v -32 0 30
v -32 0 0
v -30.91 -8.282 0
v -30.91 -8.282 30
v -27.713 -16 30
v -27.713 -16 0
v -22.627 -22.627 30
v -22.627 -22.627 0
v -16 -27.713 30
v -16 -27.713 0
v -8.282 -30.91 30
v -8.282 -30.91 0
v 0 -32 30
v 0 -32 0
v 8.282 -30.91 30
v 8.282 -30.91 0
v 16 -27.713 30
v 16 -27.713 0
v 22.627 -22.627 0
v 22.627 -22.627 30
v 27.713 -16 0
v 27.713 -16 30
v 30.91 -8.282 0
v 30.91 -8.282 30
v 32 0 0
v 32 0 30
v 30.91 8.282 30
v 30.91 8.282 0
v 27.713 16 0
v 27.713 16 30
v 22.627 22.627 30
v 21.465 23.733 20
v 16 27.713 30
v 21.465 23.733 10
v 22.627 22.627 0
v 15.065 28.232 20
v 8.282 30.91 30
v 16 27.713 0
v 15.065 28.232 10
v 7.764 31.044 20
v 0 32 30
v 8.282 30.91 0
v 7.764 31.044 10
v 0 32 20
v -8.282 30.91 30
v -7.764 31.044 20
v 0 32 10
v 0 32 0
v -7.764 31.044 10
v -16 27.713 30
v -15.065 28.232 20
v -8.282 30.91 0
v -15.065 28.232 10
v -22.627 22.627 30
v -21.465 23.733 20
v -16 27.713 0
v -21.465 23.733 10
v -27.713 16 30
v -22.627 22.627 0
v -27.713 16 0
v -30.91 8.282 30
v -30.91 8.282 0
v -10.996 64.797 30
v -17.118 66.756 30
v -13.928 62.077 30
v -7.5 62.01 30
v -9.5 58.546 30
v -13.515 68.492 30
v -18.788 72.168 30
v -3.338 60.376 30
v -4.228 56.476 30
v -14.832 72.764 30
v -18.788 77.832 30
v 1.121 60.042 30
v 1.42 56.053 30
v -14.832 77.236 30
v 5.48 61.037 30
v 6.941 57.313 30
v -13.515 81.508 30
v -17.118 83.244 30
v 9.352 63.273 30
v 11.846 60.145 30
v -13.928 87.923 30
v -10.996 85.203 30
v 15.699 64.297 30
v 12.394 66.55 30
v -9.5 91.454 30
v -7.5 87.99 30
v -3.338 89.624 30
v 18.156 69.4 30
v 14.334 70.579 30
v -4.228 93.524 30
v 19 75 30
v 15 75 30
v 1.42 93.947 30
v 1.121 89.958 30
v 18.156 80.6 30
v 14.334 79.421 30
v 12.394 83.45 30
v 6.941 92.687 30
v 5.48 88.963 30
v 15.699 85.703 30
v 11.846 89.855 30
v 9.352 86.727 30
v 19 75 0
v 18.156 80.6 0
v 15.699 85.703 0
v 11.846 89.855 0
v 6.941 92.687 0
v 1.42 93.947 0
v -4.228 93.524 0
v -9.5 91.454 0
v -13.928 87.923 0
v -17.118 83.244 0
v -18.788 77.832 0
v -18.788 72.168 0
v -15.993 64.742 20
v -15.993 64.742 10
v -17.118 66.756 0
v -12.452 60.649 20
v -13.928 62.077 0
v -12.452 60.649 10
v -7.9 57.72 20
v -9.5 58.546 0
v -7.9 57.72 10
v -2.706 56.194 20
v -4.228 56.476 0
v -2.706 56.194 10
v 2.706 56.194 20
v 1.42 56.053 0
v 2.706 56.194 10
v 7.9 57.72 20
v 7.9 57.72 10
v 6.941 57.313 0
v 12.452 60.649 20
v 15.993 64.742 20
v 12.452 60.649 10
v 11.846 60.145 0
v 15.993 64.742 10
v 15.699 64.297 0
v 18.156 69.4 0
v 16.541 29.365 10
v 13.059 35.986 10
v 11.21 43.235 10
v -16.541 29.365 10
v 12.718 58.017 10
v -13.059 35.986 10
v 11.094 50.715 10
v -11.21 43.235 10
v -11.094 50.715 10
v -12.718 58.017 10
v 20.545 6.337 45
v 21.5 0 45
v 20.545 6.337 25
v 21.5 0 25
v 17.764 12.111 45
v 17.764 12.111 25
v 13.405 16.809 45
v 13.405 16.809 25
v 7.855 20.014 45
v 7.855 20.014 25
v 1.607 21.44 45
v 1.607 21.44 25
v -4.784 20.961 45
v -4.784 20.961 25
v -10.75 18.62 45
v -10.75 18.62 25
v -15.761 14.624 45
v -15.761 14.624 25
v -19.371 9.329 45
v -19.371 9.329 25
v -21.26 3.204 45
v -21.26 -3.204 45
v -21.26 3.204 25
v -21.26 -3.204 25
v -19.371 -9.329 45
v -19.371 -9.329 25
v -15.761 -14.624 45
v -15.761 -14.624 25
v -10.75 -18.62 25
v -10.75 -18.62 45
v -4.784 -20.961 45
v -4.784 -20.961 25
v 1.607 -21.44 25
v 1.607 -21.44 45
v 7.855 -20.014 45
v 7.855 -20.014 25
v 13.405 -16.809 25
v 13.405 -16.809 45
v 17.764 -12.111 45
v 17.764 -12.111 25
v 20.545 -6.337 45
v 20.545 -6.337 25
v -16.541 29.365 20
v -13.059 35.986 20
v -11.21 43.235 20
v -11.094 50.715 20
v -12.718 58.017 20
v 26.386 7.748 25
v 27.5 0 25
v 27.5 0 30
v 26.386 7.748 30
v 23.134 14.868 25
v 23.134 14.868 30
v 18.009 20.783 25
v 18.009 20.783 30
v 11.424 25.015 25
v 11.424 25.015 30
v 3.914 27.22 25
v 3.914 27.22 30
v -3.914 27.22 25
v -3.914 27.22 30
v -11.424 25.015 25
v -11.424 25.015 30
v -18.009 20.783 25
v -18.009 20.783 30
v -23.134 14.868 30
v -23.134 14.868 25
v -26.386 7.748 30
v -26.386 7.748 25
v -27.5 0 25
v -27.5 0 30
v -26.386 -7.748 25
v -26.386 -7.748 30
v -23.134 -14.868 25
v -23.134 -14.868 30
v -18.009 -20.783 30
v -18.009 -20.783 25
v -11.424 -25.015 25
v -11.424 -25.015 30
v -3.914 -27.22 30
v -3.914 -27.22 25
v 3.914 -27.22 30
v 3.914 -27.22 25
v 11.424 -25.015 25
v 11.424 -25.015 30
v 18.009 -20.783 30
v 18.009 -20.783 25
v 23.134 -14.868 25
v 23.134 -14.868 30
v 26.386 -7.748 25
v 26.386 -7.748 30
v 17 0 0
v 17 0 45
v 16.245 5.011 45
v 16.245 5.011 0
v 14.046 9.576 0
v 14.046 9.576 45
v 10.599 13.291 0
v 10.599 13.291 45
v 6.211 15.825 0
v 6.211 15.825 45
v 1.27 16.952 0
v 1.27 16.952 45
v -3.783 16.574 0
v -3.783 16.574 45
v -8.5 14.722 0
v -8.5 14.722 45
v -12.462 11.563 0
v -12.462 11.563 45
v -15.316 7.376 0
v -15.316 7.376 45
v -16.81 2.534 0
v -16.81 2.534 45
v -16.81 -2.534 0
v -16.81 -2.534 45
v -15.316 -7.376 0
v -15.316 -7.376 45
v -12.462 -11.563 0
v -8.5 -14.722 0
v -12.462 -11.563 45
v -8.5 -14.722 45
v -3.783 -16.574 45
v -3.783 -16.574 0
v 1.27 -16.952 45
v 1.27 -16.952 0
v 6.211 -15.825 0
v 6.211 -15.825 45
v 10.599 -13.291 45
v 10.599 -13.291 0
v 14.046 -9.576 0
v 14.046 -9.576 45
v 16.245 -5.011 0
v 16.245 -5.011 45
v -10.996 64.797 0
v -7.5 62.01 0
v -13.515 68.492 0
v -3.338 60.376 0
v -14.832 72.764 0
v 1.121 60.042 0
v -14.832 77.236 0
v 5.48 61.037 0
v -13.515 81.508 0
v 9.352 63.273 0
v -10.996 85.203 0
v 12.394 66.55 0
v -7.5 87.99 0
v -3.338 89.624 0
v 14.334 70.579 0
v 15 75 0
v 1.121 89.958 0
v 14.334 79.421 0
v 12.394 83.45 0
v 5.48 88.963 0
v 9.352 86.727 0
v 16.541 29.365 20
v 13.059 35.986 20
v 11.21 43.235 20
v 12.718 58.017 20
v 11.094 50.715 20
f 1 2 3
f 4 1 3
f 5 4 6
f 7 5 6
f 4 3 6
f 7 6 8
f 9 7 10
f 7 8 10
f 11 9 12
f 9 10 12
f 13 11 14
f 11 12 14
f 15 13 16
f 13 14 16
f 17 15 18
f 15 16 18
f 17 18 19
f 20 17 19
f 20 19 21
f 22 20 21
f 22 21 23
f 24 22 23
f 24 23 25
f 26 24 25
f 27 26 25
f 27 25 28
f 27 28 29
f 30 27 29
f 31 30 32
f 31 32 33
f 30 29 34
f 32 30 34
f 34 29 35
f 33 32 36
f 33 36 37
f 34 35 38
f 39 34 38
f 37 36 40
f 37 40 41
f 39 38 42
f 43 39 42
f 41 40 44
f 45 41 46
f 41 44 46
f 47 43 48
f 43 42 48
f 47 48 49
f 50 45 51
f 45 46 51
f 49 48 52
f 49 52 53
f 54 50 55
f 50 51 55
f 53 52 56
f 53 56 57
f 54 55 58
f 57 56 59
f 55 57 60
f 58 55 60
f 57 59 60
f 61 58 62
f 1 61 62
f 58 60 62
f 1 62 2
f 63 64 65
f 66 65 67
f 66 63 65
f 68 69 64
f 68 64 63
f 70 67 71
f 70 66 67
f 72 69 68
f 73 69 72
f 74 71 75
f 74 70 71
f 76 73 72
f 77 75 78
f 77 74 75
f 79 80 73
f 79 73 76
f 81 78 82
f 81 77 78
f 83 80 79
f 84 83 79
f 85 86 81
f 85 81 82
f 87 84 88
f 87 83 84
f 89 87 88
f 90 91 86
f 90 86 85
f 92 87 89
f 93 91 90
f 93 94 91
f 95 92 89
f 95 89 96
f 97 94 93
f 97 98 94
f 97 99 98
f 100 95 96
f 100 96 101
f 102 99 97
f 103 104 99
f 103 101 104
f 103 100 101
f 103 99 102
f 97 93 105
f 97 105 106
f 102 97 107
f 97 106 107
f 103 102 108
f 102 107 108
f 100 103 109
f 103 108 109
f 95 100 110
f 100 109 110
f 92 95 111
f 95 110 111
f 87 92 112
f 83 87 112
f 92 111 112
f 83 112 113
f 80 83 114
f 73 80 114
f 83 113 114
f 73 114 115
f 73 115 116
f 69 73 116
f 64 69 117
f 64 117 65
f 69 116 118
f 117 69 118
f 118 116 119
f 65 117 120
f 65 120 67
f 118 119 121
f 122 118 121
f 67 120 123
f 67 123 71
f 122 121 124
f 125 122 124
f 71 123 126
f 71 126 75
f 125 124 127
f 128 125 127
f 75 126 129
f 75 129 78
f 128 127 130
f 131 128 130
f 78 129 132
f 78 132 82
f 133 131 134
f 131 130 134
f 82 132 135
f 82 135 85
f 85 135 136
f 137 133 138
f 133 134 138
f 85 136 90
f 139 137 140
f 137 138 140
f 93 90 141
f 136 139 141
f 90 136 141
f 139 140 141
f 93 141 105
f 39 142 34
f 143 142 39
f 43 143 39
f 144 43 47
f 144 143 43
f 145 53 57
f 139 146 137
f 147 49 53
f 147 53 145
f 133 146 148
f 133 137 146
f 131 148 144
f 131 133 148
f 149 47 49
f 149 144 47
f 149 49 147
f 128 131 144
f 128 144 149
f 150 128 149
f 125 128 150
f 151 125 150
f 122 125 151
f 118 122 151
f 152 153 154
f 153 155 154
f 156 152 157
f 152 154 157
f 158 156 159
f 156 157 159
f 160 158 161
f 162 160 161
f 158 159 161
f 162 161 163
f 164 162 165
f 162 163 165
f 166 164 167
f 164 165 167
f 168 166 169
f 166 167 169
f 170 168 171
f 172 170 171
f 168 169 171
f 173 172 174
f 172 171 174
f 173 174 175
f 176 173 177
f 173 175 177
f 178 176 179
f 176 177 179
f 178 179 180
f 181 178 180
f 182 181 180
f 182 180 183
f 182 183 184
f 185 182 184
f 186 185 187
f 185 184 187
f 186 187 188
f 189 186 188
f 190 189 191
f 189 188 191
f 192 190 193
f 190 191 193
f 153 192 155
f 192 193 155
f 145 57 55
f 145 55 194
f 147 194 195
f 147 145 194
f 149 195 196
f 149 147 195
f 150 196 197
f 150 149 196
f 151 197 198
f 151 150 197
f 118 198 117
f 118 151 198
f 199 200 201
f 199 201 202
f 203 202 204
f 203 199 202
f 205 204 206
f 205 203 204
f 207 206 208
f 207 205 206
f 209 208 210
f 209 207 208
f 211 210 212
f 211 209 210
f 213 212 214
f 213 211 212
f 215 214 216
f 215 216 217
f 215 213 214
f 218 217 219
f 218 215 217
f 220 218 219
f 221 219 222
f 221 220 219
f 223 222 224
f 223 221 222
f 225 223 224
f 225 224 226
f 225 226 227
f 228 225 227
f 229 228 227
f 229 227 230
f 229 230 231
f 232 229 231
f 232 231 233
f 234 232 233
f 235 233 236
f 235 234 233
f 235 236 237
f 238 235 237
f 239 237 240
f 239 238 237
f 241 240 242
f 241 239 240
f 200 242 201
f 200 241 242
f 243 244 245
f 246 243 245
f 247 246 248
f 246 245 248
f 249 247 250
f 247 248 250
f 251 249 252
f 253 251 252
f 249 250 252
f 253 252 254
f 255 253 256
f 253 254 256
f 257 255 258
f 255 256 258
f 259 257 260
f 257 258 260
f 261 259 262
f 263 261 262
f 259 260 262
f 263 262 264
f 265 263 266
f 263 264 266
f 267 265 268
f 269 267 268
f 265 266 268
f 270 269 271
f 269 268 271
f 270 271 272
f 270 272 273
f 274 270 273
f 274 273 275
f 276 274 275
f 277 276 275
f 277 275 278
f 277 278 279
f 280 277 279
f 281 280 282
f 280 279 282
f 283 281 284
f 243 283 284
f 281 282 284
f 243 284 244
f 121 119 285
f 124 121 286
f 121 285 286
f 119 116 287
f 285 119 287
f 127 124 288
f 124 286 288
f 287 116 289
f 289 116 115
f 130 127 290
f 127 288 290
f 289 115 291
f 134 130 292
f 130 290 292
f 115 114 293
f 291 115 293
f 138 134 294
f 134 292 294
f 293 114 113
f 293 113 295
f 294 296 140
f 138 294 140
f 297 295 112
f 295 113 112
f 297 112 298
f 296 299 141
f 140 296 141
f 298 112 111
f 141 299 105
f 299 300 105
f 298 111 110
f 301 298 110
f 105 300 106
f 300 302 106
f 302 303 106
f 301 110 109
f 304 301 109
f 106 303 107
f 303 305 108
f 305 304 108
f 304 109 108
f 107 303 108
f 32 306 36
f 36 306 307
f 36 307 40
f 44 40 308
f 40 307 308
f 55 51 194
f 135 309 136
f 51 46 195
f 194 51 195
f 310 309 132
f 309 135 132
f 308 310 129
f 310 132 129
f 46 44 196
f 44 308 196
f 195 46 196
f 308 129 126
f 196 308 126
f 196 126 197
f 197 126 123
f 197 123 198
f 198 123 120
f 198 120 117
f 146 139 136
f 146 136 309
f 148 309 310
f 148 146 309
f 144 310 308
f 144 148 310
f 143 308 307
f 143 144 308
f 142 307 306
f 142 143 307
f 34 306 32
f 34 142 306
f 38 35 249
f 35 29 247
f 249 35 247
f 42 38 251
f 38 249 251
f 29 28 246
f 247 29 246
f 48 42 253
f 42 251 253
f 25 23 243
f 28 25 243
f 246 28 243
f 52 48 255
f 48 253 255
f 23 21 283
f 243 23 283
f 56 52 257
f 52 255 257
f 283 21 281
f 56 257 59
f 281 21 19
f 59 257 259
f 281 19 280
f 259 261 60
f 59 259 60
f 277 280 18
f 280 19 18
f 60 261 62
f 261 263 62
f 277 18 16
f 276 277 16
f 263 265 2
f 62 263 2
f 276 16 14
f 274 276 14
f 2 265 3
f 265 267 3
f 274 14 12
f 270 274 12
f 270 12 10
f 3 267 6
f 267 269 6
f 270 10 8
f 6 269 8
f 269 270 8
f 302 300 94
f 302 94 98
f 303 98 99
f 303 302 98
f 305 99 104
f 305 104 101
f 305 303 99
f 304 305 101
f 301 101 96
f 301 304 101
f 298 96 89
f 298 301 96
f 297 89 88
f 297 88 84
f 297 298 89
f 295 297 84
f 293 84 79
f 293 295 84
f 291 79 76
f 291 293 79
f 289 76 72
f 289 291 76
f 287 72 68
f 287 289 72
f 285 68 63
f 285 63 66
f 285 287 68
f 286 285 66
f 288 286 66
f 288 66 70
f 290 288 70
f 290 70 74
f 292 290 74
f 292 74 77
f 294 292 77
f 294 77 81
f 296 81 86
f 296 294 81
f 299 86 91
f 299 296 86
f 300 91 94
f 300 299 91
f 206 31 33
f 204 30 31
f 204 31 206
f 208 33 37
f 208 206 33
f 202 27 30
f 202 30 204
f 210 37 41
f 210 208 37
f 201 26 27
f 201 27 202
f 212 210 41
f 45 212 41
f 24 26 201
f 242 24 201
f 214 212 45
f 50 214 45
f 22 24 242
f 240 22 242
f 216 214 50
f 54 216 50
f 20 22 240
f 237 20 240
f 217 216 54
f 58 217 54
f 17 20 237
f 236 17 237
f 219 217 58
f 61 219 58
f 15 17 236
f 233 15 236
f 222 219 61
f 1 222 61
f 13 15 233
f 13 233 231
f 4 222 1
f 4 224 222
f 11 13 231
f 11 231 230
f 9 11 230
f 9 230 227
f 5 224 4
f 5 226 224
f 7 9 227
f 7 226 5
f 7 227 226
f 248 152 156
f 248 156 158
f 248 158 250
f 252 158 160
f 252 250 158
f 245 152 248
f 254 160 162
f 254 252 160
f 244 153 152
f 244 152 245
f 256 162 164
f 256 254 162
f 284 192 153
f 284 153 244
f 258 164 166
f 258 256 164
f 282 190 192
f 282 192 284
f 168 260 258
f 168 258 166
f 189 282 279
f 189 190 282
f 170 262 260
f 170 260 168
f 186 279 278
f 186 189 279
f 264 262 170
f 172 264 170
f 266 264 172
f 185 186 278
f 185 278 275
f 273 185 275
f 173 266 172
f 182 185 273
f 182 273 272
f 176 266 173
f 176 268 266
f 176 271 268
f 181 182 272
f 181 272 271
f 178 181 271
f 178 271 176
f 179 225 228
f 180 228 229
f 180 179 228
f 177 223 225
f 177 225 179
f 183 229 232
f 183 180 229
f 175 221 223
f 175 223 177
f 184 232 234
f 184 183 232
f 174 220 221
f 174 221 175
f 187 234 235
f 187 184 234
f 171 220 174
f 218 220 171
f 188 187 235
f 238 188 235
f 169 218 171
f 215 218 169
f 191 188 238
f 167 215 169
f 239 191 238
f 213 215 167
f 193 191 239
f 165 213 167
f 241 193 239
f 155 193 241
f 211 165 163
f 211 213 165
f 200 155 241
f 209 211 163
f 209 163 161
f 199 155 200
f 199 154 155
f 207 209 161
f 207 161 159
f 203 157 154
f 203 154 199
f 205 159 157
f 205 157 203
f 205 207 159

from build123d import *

# Parameters (mm, degrees)
SKETCH1_R           = 32
BOSS_EXTRUDE3_DEPTH = 45
SKETCH4_R           = 17
CUT_EXTRUDE1_DEPTH  = 45
CUT_EXTRUDE2_START  = -15
SKETCH5_R           = 32
SKETCH5_R_2         = 21.5
CUT_EXTRUDE2_DEPTH  = 15
CUT_EXTRUDE3_START  = -5
SKETCH6_R           = 27.5
SKETCH6_R_2         = 21.5
CUT_EXTRUDE3_DEPTH  = 5
SKETCH7_R           = 19
SKETCH7_R_2         = 15
BOSS_EXTRUDE4_DEPTH = 30
BOSS_EXTRUDE5_START = 10
BOSS_EXTRUDE5_DEPTH = 10


with BuildPart() as part:
    # Sketch1 → Boss-Extrude3 (new body)
    with BuildSketch(Plane.XY):
        with Locations(Location((0, 0, 0), (0, 0, 180))):
            Circle(SKETCH1_R)
    extrude(amount=BOSS_EXTRUDE3_DEPTH)

    # Sketch4 → Cut-Extrude1 (cut)
    with BuildSketch(Plane.XY.offset(45)):
        Circle(SKETCH4_R)
    extrude(amount=-CUT_EXTRUDE1_DEPTH, mode=Mode.SUBTRACT)

    # Sketch5 → Cut-Extrude2 (cut)
    with BuildSketch(Plane.XY.offset(45).offset(CUT_EXTRUDE2_START)):
        with Locations(Location((0, 0, 0), (0, 0, 180))):
            Circle(SKETCH5_R)
        Circle(SKETCH5_R_2, mode=Mode.SUBTRACT)
    extrude(amount=CUT_EXTRUDE2_DEPTH, mode=Mode.SUBTRACT)

    # Sketch6 → Cut-Extrude3 (cut)
    with BuildSketch(Plane.XY.offset(30).offset(CUT_EXTRUDE3_START)):
        Circle(SKETCH6_R)
        Circle(SKETCH6_R_2, mode=Mode.SUBTRACT)
    extrude(amount=CUT_EXTRUDE3_DEPTH, mode=Mode.SUBTRACT)



with BuildPart() as body_2:
    # Sketch7 → Boss-Extrude4 (new body)
    with BuildSketch(Plane.XY):
        with Locations((0, 75)):
            Circle(SKETCH7_R)
        with Locations((0, 75)):
            Circle(SKETCH7_R_2, mode=Mode.SUBTRACT)
    extrude(amount=BOSS_EXTRUDE4_DEPTH)


with BuildPart() as part_1:
    add(part.part)

    add(body_2.part)  # Boss-Extrude5 merges body 2
    # Sketch8 → Boss-Extrude5 (add)
    with BuildSketch(Plane.XY.offset(BOSS_EXTRUDE5_START)):
        with BuildLine():
            ThreePointArc((15.993228521, 64.74248366), (11.210252348, 43.234782297), (21.464596173, 23.733333333))
            ThreePointArc((21.464596173, 23.733333333), (0, 32), (-21.464596173, 23.733333333))
            ThreePointArc((-21.464596173, 23.733333333), (-11.210252348, 43.234782297), (-15.993228521, 64.74248366))
            ThreePointArc((-15.993228521, 64.74248366), (0, 56), (15.993228521, 64.74248366))
        make_face()
    extrude(amount=BOSS_EXTRUDE5_DEPTH)


solid = part_1.part
